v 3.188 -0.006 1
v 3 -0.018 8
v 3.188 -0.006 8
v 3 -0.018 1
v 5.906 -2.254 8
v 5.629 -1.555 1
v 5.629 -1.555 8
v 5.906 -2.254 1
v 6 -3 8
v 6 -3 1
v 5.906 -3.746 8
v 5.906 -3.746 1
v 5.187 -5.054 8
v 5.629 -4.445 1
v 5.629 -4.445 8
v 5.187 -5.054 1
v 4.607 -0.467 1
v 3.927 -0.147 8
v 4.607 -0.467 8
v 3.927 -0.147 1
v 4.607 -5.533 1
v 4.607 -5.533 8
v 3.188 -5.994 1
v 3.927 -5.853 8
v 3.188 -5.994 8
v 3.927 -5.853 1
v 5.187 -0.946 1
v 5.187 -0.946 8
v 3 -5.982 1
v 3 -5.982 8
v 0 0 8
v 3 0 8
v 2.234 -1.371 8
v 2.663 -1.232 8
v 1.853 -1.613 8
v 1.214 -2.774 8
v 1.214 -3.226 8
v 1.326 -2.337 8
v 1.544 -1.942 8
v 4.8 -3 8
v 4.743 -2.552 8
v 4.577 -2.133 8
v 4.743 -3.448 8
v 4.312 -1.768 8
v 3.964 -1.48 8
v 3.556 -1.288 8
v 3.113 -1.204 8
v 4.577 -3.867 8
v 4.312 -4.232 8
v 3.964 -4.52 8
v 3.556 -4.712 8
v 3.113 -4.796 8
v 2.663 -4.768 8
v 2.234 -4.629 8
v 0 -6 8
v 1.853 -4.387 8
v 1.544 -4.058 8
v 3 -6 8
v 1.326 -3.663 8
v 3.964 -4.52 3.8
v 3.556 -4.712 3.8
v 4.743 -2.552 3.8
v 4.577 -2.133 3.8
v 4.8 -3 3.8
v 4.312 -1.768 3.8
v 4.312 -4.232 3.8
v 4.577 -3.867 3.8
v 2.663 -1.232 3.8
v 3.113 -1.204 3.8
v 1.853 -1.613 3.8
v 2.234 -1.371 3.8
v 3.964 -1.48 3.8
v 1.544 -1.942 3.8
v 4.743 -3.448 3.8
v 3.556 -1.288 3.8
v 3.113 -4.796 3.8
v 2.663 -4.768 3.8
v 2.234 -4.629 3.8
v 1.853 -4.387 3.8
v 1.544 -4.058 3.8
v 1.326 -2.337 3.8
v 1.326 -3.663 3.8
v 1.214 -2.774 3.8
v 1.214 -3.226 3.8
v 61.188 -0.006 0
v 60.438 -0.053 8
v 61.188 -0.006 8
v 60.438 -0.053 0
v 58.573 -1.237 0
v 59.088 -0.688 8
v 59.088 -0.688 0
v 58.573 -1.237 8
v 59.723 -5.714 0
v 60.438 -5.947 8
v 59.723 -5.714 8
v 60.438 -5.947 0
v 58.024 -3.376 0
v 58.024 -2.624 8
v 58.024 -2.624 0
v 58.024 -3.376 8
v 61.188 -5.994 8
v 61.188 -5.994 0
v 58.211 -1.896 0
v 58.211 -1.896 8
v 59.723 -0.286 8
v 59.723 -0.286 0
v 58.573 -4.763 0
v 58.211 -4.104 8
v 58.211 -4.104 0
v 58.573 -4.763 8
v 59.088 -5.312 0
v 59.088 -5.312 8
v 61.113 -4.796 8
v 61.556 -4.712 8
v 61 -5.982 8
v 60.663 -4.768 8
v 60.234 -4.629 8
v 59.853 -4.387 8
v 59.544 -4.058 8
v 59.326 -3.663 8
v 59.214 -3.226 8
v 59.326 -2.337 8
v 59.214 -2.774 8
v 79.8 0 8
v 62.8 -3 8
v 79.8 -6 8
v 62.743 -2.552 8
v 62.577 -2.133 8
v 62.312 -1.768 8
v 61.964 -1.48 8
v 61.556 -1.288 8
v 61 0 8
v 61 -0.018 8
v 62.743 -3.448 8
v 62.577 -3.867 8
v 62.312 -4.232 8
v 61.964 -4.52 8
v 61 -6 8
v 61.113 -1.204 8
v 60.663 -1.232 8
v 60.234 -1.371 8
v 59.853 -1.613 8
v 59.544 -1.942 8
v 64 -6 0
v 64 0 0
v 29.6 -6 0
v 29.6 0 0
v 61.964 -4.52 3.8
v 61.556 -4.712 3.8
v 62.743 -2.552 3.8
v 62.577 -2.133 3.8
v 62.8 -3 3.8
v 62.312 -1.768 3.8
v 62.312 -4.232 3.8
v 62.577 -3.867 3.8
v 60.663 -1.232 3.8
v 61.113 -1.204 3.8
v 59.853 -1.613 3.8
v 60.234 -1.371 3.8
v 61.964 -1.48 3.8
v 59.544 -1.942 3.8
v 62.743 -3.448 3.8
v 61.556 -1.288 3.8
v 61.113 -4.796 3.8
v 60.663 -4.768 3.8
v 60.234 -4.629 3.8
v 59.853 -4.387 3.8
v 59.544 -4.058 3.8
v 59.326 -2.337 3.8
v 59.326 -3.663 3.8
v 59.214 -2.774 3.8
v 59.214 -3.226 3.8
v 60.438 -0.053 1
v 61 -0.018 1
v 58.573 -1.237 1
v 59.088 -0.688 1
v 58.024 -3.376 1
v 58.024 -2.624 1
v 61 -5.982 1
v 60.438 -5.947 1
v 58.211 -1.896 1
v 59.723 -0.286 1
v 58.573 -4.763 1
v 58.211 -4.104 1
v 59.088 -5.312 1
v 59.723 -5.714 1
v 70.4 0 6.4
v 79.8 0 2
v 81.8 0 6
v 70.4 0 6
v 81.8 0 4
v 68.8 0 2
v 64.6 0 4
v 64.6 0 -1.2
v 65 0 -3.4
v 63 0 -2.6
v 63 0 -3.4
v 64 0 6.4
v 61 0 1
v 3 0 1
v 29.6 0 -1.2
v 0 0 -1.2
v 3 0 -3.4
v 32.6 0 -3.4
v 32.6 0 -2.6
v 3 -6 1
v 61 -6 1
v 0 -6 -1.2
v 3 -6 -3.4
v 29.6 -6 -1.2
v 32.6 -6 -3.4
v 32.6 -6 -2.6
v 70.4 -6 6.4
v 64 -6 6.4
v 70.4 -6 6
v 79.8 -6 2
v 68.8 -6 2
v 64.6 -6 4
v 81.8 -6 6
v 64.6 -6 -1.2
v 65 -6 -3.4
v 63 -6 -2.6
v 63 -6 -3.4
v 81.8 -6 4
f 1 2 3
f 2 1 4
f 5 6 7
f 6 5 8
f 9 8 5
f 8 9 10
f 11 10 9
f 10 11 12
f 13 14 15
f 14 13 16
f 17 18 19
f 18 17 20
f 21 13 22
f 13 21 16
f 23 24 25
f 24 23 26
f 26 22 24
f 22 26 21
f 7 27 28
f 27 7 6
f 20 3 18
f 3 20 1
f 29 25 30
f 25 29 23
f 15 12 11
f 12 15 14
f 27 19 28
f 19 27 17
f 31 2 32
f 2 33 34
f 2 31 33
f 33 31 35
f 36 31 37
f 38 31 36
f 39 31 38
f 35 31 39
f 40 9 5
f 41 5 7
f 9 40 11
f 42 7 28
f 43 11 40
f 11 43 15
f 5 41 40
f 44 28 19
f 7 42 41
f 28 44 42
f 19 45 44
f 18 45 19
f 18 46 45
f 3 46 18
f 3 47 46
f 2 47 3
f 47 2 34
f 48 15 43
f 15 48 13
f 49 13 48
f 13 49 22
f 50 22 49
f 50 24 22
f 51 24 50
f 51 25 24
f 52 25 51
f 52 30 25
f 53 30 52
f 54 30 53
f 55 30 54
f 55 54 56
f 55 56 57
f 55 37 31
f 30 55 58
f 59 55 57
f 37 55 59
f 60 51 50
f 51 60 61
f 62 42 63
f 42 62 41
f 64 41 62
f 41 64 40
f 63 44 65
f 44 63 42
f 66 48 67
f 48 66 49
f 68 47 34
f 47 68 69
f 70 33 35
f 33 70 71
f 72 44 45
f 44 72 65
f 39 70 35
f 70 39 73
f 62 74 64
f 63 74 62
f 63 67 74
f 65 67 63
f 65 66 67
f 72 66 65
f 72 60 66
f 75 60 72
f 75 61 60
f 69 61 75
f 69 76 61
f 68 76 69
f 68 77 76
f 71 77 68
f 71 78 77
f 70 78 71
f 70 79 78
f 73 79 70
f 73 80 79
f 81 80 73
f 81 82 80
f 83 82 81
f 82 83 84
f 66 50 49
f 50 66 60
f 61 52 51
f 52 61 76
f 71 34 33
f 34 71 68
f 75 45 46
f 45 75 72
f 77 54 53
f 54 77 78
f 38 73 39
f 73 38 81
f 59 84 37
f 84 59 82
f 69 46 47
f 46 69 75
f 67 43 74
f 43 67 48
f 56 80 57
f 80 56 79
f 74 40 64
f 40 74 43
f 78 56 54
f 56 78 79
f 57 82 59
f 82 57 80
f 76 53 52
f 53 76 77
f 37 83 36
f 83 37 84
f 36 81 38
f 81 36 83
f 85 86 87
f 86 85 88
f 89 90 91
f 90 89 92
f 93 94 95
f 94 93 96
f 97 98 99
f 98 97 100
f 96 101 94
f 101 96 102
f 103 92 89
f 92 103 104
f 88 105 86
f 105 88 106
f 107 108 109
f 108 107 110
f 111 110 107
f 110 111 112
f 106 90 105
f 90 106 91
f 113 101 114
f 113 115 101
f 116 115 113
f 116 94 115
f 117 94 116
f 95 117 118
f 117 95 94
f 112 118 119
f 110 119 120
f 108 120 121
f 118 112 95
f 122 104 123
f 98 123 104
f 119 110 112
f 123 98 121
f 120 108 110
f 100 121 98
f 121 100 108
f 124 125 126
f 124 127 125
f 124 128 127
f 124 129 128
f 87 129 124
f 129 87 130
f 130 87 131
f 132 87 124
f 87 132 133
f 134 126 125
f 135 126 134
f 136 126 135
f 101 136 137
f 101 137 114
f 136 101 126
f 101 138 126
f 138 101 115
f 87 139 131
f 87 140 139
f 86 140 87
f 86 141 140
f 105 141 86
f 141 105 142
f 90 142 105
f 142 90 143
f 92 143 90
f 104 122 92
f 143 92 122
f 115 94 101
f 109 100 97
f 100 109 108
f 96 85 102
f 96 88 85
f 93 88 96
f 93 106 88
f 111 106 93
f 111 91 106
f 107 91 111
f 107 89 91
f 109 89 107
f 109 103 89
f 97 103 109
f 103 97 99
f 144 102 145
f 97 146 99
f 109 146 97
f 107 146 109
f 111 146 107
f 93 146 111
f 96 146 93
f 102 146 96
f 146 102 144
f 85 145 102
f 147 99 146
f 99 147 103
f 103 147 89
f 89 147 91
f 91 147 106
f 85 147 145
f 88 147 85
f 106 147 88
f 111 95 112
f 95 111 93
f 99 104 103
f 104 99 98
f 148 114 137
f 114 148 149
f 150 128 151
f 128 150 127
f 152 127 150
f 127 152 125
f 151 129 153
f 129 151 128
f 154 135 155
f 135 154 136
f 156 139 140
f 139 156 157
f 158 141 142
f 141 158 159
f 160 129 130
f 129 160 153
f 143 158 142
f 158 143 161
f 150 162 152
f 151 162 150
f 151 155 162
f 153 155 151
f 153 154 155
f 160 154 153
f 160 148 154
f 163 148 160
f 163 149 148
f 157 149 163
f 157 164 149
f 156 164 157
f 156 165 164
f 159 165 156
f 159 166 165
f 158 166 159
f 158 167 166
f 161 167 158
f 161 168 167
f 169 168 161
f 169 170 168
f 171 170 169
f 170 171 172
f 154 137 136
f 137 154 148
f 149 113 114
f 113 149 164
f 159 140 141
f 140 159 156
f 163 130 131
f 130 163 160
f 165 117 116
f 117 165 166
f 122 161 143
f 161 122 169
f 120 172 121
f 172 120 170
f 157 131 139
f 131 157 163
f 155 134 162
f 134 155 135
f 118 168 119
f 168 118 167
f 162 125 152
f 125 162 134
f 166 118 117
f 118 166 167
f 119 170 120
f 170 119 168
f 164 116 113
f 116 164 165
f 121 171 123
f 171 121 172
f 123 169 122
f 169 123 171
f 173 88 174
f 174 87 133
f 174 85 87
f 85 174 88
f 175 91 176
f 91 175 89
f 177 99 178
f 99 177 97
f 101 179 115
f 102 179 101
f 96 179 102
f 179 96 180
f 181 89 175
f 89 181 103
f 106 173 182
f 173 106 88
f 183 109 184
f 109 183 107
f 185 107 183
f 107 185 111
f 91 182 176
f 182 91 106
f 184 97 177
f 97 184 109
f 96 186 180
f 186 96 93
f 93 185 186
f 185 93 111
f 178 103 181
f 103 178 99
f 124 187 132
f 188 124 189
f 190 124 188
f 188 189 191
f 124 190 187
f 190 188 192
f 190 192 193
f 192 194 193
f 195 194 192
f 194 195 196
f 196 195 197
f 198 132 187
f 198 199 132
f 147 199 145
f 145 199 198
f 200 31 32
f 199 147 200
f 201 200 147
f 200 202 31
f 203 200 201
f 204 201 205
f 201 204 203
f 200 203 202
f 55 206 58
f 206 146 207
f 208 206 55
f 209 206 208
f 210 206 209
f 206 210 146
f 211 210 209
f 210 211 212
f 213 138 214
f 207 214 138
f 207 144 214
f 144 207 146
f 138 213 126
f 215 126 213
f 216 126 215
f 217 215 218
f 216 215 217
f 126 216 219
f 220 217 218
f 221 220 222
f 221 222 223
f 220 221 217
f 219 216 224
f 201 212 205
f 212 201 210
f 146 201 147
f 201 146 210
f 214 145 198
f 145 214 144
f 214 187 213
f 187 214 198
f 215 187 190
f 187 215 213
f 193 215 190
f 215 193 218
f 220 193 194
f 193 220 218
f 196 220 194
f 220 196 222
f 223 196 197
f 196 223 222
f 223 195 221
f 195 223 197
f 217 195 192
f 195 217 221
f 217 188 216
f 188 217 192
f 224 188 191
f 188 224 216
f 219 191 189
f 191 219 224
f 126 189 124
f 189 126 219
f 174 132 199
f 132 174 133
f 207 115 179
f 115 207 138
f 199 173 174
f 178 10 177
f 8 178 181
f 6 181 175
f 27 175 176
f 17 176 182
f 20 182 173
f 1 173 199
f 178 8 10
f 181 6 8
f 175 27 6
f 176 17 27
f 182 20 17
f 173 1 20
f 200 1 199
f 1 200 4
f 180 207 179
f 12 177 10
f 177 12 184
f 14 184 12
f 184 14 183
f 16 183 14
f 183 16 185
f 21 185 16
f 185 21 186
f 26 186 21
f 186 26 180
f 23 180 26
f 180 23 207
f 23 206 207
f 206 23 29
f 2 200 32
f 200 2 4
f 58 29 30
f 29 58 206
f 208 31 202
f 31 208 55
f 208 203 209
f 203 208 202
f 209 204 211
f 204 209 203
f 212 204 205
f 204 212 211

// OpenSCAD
// file: ../m2_5/m2_5.scad
module m2_5_ThreadedInsert() {
    cylinder(h=4.2, d=3.6, $fn=25);
}

module m2_5_mountingHole(height=4) {
    union() {
        translate([0,0,2])
            cylinder(h=height-2, d=4, $fn=25);

        cylinder(h=height, d=2.6, $fn=25); 
    }
}
// file: piDinRailMount.scad
include <../m2_5/m2_5.scad>

module piDinRailMount_column(frameZ=1) {
    let(usbZ=7, colZ=usbZ+frameZ) {
        difference() {
            cylinder(h=colZ, d=6, $fn=25);
            
            translate([0,0,colZ-4.2])
                m2_5_ThreadedInsert();
        }
    }
}

module piDinRailMount_holePattern(center=false,holeDistance=58) {
    translate([center?holeDistance/-2:0,0]) {
        for (x = [0:holeDistance:holeDistance]) {
            translate([x,0,0])
                children();
        }
    }
}

module piDinRailMount_outline(holeDistance=58) {
    let(usbY=7, frameY=1, colY=usbY+frameY,dinY=35.4,holeX=holeDistance+6) {
        polygon([
            [0,0],
            [0,colY],
            [3,colY],
            [3,frameY],
            [holeX-3,frameY],
            [holeX-3,colY],
            [holeX,colY],
            // lever
            [holeX+5.8+10,colY],
            [holeX+5.8+12,colY-2],
            [holeX+5.8+12,colY-4],
            [holeX+5.8+10,colY-6],
            [holeX+4.8,colY-6],
            //clip
            [holeX+1,-3.4],
            [holeX-1,-3.4],
            [holeX-1,-2.6],
            [holeX+0.6,-1.2],
            [holeX+0.6,colY-4],
            [holeX+0.6+5.8,colY-2],
            [holeX+0.6+5.8,colY-1.6],
            [holeX+0.6,colY-1.6],
            [holeX,colY-1.6],
            // Pin
            [holeX,0],
            [holeX-dinY+1,0],
            [holeX-dinY+1,-1.2],
            [holeX-dinY+1+3,-2.6],
            [holeX-dinY+1+3,-3.4],
            [holeX-dinY-1,-3.4],
            [3,-3.4],
            [0,-1.2],
        ]);
    }
}

module piDinRailMount(holeDistance=58) {
    let(usbZ=7, frameZ=1, colZ=usbZ+frameZ) {
        union() {
            translate([3,-3,0])
                piDinRailMount_holePattern(center=false,holeDistance=holeDistance)
                    piDinRailMount_column(frameZ);

            difference() {
                rotate([90,0,0])
                    linear_extrude(6)
                        piDinRailMount_outline(holeDistance=holeDistance);
                
                translate([3,-3,0])
                    piDinRailMount_holePattern(center=false, holeDistance=holeDistance)
                        cylinder(h=colZ, d=6, $fn=25);
            }
        }
    }
}
// main file
include <piDinRailMount.scad>

Select = 0; // [0:Preview]

HoleDistance=58.0;

if (Select==0) {
    piDinRailMount(HoleDistance);
}
